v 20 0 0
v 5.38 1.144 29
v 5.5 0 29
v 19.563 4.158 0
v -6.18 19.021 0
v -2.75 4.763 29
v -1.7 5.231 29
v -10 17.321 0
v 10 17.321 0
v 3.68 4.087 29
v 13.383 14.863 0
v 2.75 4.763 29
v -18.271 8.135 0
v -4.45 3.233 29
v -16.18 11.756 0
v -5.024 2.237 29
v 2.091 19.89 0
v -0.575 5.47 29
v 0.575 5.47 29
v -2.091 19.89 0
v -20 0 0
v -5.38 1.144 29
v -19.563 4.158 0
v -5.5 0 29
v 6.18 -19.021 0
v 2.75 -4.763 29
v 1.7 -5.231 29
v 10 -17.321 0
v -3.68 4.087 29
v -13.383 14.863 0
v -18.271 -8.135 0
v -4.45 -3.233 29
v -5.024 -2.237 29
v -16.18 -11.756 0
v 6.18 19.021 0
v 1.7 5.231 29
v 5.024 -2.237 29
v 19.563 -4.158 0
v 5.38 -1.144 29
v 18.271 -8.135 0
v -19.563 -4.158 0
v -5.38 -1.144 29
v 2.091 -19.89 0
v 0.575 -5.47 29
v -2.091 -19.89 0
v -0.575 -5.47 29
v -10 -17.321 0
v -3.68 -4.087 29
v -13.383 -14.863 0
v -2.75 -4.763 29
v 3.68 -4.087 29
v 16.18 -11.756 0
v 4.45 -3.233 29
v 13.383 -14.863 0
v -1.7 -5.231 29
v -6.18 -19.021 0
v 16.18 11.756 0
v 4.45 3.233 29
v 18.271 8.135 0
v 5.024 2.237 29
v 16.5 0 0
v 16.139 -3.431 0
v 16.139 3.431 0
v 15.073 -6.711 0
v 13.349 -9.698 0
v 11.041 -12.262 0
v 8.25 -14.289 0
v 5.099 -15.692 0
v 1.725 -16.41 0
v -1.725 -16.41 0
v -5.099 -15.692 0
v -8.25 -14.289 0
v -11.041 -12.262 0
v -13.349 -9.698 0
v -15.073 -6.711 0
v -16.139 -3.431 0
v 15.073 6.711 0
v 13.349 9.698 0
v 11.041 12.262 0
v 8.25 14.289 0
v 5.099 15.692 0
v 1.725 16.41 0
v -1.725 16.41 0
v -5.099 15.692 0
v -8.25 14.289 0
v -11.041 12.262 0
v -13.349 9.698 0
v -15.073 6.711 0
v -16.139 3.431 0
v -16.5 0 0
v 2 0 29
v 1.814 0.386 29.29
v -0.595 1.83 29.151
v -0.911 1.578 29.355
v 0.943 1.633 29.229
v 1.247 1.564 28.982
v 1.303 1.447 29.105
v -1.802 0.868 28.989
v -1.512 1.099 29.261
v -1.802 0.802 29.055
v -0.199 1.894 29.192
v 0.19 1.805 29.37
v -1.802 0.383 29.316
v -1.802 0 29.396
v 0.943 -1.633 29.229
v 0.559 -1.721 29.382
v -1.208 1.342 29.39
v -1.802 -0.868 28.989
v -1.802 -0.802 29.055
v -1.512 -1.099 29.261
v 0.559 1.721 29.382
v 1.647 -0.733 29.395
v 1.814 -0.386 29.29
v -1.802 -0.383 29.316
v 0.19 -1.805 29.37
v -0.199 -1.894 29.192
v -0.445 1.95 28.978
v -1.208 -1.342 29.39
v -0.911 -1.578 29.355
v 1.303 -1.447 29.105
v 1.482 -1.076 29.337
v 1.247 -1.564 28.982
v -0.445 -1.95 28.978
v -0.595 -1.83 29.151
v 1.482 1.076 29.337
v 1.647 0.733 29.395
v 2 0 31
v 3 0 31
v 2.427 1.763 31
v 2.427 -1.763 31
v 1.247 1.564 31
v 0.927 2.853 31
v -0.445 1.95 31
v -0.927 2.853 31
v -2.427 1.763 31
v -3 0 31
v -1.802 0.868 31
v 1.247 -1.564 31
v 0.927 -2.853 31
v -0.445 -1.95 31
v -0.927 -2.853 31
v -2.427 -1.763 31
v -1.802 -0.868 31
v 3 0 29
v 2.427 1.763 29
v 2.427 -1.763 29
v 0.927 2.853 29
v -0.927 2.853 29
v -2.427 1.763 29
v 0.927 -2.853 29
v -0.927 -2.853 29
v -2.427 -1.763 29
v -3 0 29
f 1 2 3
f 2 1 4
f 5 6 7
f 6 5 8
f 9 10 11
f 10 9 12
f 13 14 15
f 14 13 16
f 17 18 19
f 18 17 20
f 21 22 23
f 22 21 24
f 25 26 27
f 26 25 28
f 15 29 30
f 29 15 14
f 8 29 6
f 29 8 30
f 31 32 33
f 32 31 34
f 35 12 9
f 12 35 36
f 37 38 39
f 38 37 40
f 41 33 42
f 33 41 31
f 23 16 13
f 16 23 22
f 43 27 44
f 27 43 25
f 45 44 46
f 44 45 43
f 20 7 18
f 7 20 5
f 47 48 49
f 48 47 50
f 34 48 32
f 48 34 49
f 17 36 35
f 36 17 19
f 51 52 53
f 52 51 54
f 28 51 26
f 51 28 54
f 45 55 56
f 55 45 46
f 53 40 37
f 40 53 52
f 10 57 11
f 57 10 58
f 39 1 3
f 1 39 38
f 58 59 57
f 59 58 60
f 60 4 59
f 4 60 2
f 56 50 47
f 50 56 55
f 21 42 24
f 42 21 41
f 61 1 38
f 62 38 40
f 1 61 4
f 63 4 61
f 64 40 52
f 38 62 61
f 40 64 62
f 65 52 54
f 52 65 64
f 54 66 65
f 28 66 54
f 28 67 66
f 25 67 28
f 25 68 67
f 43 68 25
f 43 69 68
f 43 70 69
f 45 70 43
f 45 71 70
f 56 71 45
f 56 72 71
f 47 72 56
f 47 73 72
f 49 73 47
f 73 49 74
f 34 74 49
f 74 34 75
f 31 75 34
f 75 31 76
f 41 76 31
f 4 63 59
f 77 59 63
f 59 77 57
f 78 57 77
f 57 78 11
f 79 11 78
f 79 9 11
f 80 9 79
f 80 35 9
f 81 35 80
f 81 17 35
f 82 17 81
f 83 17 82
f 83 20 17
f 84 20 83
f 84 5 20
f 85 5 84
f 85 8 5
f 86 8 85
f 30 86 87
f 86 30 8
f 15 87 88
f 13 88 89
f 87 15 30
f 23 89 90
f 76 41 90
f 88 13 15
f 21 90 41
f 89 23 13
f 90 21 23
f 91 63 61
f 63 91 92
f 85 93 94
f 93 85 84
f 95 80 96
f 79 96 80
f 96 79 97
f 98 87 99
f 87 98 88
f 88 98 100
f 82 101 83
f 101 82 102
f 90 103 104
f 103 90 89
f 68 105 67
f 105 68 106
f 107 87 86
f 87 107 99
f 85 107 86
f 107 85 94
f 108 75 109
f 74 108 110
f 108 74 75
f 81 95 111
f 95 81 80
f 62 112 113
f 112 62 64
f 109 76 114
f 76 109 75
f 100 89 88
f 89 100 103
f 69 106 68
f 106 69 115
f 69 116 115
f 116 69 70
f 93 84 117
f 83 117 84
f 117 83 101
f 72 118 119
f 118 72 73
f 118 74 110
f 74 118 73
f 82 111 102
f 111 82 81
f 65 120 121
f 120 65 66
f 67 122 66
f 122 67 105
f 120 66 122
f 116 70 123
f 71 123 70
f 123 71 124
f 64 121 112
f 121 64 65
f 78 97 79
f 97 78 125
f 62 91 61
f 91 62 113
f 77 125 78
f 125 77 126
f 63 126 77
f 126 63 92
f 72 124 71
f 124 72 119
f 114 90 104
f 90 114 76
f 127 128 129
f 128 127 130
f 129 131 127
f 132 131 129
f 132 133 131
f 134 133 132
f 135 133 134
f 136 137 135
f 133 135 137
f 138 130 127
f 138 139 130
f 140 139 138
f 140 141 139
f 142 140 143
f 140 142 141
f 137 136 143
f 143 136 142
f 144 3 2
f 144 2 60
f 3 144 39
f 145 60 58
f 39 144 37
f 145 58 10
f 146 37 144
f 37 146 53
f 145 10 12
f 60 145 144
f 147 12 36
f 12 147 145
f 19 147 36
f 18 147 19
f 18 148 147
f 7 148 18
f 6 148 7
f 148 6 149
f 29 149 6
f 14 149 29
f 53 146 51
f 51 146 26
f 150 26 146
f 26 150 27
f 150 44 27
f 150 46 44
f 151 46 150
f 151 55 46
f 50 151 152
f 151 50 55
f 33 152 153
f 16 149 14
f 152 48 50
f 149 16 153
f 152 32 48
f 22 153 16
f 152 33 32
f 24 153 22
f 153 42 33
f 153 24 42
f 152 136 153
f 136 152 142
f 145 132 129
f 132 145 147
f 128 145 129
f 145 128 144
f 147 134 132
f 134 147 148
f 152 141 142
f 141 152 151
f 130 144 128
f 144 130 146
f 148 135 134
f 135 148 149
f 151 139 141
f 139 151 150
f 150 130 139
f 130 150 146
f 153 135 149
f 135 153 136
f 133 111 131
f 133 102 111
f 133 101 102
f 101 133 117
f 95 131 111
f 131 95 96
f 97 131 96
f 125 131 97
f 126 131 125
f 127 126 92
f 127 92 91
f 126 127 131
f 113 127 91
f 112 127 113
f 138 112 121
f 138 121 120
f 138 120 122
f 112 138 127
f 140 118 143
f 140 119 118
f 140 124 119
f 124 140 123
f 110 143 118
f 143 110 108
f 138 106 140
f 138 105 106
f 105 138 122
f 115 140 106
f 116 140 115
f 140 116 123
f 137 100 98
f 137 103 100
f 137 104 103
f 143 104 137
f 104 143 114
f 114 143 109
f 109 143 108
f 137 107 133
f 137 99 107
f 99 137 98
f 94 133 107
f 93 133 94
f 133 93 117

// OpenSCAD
// pollenFunnel


module pollenHopper(){
    difference(){
{difference(){
{difference(){
translate([0,-15,0]){
    difference(){
cylinder(16, 7,7);
  cylinder(16, 6/2,6/2);}}
  
  
 translate([0,-5, 21]) rotate([90,0,0]) cylinder(40, 7,7);}}
 
 
}}}}
 

 




 difference(){
difference(){
 difference(){
 difference(){
     cylinder(40, 20, 0); 
    translate([0,0,-7]) cylinder(40, 20, 0); }
 
 translate([0,0,31]) cylinder(16, 7,7);
     
     
     }
     
     translate([0, 15, 29]) pollenHopper();}
     
     
     
     cylinder(100, 2, 2);}
